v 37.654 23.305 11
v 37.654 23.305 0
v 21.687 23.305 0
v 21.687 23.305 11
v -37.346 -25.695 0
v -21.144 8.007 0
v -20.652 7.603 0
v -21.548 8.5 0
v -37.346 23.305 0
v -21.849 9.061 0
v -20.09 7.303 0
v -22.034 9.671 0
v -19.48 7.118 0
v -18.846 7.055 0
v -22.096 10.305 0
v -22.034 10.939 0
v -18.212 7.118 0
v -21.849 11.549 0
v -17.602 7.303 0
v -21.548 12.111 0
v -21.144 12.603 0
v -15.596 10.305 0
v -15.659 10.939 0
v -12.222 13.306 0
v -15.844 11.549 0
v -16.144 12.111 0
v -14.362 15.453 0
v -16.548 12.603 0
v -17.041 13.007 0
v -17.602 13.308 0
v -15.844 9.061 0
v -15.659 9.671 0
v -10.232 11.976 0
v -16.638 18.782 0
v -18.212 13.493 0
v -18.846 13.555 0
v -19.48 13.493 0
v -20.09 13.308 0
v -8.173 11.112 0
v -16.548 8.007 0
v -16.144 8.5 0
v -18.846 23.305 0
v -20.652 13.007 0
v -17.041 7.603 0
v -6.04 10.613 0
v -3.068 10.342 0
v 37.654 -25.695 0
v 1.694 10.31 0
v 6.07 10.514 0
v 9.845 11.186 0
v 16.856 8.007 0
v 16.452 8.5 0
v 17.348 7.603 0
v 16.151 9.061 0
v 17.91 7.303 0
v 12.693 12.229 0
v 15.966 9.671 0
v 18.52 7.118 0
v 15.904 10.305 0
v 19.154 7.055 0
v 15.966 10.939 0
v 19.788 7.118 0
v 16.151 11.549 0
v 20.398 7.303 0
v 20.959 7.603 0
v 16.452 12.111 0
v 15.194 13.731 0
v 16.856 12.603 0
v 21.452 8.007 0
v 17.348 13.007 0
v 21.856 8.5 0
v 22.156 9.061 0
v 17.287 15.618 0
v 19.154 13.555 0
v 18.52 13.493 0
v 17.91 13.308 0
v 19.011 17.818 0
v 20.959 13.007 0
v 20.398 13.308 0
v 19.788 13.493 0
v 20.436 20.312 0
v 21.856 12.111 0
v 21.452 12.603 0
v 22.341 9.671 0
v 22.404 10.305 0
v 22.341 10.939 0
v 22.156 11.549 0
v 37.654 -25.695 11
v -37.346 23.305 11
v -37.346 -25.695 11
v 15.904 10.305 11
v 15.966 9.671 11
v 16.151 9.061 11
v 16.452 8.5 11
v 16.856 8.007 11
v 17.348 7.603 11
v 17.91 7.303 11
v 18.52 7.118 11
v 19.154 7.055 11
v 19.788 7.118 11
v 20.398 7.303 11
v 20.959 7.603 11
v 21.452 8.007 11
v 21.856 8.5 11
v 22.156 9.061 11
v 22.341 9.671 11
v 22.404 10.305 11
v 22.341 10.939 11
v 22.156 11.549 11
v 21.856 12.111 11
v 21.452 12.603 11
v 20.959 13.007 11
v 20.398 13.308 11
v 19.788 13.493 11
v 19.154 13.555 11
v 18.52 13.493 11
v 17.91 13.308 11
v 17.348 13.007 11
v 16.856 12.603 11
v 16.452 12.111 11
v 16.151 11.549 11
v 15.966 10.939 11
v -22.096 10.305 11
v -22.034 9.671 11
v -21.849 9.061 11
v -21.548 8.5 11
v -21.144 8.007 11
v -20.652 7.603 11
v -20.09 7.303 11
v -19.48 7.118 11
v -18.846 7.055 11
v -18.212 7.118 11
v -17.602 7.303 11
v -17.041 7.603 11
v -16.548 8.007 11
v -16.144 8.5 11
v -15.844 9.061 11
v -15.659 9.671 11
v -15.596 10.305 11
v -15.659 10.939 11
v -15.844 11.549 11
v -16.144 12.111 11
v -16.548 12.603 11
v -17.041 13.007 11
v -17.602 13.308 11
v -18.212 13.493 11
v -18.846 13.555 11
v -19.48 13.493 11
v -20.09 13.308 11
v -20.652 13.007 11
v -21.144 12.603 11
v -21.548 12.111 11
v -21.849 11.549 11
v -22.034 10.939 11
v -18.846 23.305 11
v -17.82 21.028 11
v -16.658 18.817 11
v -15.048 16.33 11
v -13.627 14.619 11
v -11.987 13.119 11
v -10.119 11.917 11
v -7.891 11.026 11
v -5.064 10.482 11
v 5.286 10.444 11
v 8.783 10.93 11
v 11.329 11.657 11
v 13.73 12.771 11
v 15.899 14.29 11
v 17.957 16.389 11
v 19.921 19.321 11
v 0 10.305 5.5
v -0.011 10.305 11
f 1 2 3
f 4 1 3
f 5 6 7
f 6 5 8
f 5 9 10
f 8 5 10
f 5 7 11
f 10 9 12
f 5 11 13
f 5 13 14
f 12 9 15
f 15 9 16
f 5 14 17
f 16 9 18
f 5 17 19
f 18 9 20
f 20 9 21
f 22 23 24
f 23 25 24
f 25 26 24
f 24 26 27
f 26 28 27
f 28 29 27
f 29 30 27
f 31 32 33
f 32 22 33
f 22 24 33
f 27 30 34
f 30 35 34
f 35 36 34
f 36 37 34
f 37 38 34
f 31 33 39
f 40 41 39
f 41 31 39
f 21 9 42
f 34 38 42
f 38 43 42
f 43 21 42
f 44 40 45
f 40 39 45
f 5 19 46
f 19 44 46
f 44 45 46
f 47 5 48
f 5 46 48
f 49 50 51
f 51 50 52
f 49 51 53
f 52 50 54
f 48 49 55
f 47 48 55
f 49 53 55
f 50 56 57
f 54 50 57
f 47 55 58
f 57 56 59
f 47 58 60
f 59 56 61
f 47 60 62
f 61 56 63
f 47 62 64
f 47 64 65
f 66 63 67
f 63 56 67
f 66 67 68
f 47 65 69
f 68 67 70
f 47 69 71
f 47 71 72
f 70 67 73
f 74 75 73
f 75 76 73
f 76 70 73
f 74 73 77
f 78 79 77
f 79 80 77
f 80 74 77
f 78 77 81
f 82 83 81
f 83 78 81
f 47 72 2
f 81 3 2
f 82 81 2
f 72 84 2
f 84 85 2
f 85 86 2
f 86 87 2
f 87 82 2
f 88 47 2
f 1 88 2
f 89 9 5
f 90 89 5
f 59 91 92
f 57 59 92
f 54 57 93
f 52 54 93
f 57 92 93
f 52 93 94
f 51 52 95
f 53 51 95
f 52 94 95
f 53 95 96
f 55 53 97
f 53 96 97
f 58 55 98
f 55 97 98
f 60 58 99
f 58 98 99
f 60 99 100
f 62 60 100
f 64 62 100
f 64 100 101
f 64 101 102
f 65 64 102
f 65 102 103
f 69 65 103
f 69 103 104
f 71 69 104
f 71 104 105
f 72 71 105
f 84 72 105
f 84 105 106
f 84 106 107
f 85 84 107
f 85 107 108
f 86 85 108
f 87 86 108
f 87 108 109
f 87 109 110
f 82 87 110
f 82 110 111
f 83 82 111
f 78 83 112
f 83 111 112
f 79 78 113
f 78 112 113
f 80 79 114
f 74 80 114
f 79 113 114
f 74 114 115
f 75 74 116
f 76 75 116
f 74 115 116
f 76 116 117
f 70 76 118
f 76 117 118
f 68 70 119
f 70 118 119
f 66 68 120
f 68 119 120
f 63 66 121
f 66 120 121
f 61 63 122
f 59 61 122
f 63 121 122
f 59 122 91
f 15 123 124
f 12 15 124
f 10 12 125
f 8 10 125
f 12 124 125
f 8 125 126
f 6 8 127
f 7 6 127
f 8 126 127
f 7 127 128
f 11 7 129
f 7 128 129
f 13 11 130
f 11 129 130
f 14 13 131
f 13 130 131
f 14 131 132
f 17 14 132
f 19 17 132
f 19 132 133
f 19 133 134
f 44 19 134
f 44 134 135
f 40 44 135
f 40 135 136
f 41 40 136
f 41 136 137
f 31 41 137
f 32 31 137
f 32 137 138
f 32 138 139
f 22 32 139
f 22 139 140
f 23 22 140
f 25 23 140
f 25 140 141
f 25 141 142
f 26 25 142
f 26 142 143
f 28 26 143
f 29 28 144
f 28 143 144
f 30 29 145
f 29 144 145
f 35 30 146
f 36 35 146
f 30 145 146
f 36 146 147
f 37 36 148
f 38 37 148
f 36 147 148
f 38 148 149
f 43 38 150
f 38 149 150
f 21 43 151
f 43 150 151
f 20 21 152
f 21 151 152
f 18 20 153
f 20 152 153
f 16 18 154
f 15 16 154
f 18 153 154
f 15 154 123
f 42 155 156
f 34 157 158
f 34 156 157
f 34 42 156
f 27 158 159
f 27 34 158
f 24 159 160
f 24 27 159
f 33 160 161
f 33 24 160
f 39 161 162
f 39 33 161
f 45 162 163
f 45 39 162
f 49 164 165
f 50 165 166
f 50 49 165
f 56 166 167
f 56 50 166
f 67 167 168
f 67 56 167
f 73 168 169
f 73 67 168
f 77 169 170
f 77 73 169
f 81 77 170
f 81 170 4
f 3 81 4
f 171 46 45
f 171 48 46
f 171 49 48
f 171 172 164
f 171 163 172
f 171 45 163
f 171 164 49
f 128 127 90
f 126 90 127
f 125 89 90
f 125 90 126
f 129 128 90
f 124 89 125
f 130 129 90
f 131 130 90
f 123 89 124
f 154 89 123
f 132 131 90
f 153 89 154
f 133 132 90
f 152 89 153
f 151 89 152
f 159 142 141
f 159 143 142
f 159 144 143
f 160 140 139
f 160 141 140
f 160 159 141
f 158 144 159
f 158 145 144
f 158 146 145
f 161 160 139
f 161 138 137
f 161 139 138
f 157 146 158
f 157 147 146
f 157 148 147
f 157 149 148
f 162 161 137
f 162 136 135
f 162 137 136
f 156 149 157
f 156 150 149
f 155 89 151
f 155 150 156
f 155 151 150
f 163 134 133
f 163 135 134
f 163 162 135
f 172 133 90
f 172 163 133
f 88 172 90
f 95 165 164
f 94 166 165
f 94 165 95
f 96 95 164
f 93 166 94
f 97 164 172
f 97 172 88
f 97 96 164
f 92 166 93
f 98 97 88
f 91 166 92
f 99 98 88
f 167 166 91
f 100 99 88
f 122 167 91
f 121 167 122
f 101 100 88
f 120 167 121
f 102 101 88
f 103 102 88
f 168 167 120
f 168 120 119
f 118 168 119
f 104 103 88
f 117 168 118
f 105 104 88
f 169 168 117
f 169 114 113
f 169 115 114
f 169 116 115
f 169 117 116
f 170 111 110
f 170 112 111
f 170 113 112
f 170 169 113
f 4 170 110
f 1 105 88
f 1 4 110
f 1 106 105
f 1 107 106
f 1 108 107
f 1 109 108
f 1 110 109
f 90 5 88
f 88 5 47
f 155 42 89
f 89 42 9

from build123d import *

# Parameters (mm, degrees)
F1_DEPTH = 11
F2_D     = 6.5
F3_DEPTH = 38.9


with BuildPart() as f1:
    # F0 (on Top) → F1 (new body)
    with BuildSketch(Plane.XY):
        with BuildLine():
            Line((-37.3461883515, 23.3051764891), (-37.3461883515, -25.6948235109))
            Line((-37.3461883515, -25.6948235109), (37.6538116485, -25.6948235109))
            Line((37.6538116485, -25.6948235109), (37.6538116485, 23.3051764891))
            Line((37.6538116485, 23.3051764891), (21.6870121658, 23.3051764891))
            add(Edge.make_bspline(
                [(-18.8461883515, 23.3051764891), (-13.3813479915, 10.3051764891), (-1.0917122471, 10.3051764891), (17.0727558434, 10.3051764891), (21.6870121658, 23.3051764891)],
                knots=[0, 0, 0, 0, 0.4875911488, 1, 1, 1, 1], degree=3))
            Line((-18.8461883515, 23.3051764891), (-37.3461883515, 23.3051764891))
        make_face()
        with BuildLine():
            Line((21.6870121658, 23.3051764891), (-18.8461883515, 23.3051764891))
            add(Edge.make_bspline(
                [(-18.8461883515, 23.3051764891), (-13.3813479915, 10.3051764891), (-1.0917122471, 10.3051764891), (17.0727558434, 10.3051764891), (21.6870121658, 23.3051764891)],
                knots=[0, 0, 0, 0, 0.4875911488, 1, 1, 1, 1], degree=3))
        make_face()
    extrude(amount=F1_DEPTH)

    # F2 (through all)
    with Locations(Plane(origin=(0, 0, 0), x_dir=(1, 0, 0), z_dir=(0, 0, -1))):
        with Locations((19.1538116485, -10.3051764891), (-18.8461883515, -10.3051764891)):
            Hole(F2_D / 2)

    # F0 (on Top) → F3 (cut)
    with BuildSketch(Plane.XY):
        with BuildLine():
            Line((21.6870121658, 23.3051764891), (-18.8461883515, 23.3051764891))
            add(Edge.make_bspline(
                [(-18.8461883515, 23.3051764891), (-13.3813479915, 10.3051764891), (-1.0917122471, 10.3051764891), (17.0727558434, 10.3051764891), (21.6870121658, 23.3051764891)],
                knots=[0, 0, 0, 0, 0.4875911488, 1, 1, 1, 1], degree=3))
        make_face()
    extrude(amount=F3_DEPTH, mode=Mode.SUBTRACT)


solid = f1.part
